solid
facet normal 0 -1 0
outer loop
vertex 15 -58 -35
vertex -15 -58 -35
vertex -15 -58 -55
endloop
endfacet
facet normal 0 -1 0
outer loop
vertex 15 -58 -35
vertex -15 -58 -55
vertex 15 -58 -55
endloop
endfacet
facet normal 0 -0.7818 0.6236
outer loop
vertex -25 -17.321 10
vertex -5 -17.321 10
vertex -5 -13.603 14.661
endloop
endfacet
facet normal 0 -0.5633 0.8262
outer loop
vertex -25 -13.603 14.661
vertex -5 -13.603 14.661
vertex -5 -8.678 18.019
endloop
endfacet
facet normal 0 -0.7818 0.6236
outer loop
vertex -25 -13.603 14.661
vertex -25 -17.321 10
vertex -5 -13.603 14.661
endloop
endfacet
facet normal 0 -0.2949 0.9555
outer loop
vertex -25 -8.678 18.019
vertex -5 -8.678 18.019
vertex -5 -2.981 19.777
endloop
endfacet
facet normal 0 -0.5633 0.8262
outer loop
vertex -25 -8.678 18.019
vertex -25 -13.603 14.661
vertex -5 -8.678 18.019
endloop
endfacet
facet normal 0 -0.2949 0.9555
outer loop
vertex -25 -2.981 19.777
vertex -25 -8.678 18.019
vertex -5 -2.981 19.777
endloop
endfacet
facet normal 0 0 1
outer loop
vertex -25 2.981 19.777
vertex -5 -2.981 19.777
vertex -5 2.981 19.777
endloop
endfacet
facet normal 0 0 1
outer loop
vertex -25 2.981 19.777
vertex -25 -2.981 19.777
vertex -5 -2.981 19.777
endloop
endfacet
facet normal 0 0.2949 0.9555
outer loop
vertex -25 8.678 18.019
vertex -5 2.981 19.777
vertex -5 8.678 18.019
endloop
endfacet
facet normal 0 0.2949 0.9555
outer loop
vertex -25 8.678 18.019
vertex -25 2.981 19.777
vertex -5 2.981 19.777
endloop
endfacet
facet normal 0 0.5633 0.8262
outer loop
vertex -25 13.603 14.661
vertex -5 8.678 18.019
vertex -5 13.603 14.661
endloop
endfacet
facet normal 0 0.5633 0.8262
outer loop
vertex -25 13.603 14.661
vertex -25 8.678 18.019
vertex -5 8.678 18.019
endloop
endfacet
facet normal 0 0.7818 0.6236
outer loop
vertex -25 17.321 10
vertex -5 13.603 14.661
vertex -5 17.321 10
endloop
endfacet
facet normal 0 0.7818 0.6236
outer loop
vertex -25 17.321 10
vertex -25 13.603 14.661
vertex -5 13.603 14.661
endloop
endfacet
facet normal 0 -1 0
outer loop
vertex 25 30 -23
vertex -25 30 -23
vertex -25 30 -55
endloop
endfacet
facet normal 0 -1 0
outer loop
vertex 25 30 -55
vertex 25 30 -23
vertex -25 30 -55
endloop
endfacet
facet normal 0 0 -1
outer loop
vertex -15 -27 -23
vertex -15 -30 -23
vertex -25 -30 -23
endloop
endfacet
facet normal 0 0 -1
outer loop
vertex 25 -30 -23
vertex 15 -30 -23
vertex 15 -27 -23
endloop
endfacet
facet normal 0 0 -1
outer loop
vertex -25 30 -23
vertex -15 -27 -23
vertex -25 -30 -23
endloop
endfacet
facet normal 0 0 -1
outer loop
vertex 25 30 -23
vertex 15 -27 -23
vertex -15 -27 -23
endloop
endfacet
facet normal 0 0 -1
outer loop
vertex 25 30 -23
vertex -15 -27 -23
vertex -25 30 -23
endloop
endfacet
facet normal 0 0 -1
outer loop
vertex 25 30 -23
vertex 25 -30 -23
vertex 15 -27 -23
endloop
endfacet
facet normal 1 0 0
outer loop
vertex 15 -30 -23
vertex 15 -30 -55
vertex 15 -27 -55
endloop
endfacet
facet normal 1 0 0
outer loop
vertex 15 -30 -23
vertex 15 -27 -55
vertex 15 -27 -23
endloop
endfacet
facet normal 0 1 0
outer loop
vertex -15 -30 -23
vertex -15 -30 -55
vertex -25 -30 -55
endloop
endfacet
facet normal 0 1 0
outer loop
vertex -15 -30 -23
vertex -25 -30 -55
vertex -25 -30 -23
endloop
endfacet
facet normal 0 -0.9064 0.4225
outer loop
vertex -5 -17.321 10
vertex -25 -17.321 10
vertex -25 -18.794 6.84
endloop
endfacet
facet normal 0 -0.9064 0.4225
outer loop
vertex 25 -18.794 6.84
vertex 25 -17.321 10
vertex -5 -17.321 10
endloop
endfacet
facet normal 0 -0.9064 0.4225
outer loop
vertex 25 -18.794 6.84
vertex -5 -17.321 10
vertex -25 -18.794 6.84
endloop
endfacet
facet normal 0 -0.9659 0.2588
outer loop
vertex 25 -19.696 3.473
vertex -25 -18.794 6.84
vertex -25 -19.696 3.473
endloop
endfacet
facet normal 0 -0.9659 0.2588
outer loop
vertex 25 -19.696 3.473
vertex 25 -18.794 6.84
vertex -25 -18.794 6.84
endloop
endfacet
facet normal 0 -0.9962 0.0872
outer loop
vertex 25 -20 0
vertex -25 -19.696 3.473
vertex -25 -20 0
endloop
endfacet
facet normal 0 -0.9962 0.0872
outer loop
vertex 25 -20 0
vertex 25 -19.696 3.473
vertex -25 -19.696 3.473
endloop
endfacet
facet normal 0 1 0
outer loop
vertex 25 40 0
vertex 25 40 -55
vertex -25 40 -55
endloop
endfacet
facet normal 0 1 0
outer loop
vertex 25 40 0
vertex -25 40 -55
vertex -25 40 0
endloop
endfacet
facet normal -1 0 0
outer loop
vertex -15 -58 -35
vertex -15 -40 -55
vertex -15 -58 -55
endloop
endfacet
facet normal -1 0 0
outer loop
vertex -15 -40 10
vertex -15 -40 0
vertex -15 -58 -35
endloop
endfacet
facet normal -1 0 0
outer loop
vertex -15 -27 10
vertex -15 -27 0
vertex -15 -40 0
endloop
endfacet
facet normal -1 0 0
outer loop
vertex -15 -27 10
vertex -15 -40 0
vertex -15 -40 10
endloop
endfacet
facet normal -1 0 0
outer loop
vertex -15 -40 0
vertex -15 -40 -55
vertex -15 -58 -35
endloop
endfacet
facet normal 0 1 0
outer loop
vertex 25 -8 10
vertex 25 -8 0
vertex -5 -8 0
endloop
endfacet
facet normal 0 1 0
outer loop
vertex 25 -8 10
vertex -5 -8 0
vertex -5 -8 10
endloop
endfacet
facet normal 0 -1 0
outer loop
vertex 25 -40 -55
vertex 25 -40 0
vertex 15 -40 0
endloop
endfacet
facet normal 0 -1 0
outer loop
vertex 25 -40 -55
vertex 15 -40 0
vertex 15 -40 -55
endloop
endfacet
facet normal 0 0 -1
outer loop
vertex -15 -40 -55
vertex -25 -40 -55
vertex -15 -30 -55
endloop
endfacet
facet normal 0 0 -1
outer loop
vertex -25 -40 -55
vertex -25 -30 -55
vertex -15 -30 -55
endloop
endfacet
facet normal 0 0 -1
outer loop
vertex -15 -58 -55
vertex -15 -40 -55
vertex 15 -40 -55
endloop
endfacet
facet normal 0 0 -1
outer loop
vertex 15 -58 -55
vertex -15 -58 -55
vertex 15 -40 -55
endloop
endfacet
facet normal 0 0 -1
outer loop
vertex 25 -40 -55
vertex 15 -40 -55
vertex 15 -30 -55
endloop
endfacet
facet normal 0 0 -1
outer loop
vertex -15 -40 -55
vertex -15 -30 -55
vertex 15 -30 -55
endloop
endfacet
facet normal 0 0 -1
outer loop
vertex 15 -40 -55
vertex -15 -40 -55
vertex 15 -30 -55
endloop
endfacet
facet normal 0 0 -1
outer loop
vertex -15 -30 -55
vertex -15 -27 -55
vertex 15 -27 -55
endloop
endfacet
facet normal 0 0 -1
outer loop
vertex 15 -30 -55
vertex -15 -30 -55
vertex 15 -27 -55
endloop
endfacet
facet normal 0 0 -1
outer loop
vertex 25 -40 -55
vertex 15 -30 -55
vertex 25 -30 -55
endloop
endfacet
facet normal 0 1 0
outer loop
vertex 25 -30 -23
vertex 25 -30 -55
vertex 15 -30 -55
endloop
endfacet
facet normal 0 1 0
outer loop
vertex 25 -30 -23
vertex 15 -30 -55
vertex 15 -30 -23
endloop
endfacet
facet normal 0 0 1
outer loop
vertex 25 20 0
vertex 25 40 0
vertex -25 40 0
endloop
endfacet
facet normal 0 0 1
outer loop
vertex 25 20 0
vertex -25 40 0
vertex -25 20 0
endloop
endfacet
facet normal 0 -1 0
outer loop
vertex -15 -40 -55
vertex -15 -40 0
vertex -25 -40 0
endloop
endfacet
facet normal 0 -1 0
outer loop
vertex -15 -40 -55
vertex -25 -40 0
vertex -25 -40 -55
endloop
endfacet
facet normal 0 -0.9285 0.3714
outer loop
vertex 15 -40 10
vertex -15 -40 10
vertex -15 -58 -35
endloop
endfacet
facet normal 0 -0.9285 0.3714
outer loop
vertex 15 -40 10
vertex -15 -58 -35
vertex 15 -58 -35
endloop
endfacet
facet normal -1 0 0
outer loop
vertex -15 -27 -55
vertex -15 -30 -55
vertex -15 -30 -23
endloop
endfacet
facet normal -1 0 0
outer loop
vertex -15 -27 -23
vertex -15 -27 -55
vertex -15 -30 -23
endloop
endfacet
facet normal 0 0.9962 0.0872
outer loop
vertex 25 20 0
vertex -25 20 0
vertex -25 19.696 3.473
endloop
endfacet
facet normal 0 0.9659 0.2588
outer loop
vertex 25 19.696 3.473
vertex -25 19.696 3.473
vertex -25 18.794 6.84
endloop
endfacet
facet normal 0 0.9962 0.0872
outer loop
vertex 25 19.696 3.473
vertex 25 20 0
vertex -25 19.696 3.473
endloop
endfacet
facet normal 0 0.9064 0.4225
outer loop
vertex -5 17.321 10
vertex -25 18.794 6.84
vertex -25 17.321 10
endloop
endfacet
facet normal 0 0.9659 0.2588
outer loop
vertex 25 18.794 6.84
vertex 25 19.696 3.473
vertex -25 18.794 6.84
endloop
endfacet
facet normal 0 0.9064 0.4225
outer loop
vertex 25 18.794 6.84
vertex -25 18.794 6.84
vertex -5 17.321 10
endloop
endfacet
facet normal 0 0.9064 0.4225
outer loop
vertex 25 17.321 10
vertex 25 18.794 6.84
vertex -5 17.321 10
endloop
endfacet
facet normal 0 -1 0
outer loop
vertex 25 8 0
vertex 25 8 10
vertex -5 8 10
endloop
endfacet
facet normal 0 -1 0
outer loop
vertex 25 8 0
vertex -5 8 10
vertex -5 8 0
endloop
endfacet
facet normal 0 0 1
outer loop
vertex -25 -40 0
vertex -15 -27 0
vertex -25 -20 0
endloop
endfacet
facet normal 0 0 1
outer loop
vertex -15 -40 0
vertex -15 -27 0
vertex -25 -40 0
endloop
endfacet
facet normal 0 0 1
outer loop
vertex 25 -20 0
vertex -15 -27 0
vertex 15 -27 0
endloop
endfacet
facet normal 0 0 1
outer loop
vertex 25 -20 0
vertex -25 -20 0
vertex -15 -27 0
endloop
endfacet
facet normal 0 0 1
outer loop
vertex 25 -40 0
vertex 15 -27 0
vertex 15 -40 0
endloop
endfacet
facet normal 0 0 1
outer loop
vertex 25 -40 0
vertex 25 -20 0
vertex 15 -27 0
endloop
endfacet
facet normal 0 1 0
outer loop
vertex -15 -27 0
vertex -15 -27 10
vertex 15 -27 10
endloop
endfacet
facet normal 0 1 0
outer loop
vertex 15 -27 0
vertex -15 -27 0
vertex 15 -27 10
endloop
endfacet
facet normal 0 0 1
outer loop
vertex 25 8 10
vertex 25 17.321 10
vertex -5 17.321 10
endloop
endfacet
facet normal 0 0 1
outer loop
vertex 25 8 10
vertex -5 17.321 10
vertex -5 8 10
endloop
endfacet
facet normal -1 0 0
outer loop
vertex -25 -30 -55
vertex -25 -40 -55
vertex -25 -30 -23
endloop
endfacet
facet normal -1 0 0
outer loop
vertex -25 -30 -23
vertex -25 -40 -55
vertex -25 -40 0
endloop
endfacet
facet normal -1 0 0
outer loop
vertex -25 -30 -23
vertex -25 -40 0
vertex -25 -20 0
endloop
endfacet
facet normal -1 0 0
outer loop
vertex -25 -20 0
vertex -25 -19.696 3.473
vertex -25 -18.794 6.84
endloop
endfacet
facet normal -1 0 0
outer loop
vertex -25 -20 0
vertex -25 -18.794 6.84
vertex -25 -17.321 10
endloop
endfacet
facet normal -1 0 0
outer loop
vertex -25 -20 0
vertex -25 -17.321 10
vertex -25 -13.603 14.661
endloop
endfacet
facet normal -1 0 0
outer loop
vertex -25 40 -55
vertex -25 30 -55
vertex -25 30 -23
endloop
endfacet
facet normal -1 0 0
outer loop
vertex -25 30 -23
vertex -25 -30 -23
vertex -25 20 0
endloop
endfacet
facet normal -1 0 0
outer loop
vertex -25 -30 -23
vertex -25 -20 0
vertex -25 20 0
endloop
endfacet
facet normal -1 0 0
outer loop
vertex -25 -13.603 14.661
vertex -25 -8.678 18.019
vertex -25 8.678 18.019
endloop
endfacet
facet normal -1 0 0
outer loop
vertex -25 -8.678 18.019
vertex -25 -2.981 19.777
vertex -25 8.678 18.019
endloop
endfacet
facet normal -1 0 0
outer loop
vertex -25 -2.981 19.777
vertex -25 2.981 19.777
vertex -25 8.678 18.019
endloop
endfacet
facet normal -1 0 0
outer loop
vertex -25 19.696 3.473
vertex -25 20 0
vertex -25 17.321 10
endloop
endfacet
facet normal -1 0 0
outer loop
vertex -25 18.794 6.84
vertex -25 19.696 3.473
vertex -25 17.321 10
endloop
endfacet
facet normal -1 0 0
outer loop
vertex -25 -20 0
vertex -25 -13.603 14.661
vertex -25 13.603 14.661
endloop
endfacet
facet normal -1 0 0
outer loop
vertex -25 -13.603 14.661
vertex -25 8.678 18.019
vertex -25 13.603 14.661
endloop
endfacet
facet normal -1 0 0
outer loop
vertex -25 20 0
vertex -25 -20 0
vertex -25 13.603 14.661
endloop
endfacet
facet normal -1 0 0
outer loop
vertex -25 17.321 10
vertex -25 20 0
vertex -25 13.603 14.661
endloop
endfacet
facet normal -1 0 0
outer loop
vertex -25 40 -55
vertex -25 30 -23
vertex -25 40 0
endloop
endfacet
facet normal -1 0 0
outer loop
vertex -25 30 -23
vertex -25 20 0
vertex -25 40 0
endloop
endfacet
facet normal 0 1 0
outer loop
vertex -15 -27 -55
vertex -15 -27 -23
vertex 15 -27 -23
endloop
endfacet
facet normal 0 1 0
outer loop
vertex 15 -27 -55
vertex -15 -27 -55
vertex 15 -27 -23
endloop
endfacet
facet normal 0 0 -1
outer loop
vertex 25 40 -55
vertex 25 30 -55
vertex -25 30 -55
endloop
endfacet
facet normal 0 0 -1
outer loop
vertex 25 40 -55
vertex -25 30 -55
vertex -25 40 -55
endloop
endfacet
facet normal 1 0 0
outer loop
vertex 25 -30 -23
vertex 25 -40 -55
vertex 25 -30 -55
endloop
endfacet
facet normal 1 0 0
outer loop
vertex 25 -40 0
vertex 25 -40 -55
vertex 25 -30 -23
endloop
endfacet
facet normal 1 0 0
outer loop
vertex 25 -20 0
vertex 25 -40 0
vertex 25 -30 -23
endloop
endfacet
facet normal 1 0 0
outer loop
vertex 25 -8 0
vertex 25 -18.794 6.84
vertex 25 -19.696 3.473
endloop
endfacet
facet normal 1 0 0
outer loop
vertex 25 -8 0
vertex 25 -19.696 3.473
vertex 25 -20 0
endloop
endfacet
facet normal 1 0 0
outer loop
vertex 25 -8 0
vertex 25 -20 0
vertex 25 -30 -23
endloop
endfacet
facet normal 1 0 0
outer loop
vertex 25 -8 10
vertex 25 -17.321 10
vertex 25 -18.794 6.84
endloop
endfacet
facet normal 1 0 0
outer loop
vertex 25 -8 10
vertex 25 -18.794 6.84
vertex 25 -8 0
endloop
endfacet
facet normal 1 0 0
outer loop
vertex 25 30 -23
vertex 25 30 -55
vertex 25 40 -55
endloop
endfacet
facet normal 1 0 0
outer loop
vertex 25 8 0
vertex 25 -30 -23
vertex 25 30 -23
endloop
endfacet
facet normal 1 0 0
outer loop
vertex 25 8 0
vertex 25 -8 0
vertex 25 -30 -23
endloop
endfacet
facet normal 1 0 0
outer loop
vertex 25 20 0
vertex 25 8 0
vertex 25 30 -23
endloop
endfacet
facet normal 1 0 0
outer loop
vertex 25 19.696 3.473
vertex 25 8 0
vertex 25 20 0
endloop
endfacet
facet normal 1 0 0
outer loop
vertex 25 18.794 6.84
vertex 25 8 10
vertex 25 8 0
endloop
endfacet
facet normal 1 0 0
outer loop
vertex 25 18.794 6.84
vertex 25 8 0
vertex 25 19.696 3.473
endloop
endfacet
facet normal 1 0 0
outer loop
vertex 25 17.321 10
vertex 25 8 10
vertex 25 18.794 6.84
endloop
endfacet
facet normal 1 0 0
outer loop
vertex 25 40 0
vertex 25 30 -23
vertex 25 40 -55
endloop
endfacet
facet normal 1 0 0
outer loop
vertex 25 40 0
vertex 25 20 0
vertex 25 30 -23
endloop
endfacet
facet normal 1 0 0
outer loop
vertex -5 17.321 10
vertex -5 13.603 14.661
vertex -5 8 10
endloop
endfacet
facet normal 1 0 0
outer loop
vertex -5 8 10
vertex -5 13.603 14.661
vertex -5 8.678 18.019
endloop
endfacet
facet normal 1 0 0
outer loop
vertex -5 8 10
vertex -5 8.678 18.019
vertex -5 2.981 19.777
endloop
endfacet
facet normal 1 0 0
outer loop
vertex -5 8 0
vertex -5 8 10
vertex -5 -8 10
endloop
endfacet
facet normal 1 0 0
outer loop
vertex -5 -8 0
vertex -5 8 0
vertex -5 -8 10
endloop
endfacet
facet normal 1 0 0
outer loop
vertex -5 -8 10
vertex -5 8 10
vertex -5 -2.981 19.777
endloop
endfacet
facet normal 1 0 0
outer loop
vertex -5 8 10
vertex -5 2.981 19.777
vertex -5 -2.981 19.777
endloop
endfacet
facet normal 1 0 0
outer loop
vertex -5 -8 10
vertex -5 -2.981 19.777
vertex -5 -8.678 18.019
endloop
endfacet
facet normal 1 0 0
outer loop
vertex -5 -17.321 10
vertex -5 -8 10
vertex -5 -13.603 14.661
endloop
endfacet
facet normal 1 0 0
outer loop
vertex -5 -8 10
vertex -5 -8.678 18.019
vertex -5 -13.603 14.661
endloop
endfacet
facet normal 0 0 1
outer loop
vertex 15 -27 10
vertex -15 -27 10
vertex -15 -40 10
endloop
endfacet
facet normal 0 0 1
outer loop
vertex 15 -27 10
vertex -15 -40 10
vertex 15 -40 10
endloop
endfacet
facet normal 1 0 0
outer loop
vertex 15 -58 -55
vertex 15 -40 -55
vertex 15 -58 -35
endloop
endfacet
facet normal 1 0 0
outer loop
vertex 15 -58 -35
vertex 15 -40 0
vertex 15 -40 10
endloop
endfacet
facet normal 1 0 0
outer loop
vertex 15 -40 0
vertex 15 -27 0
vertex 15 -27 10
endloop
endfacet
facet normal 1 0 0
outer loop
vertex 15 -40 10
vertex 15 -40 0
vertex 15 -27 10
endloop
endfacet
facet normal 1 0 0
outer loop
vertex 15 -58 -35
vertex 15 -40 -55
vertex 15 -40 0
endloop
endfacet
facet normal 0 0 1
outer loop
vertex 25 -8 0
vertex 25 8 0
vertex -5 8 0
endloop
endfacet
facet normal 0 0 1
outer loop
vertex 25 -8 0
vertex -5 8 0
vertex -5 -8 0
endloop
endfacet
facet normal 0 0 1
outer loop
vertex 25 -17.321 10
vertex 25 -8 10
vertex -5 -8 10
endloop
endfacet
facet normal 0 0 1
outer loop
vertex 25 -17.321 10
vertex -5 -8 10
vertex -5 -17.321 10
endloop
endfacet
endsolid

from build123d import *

# Parameters (mm, degrees)
F1_DEPTH      = 25
F2_W          = 30
F2_H          = 65
F3_DEPTH      = 18
F3_DEPTH_BACK = 13
F4_SIZE2      = 18
F4_SIZE       = 45
F6_DEPTH      = 20


with BuildPart() as f1:
    # F0 (on Right) → F1 (new body, symmetric)
    with BuildSketch(Plane.YZ):
        with BuildLine():
            Line((8, 0), (0, 0))
            Line((0, 0), (-8, 0))
            Line((-8, 0), (-8, 10))
            Line((-8, 10), (-17.3205080757, 10))
            ThreePointArc((-17.3205080757, 10), (-19.3185165258, 5.1763809021), (-20, 0))
            Line((-20, 0), (-40, 0))
            Line((-40, 0), (-40, -55))
            Line((-40, -55), (-30, -55))
            Line((-30, -55), (-30, -23))
            Line((-30, -23), (0, -23))
            Line((0, -23), (30, -23))
            Line((30, -23), (30, -55))
            Line((30, -55), (40, -55))
            Line((40, -55), (40, 0))
            Line((40, 0), (20, 0))
            ThreePointArc((20, 0), (19.3185165258, 5.1763809021), (17.3205080757, 10))
            Line((17.3205080757, 10), (8, 10))
            Line((8, 10), (8, 0))
        make_face()
    extrude(amount=F1_DEPTH, both=True)

    # F2 (on face) → F3 (join, two sides)
    with BuildSketch(Plane.XZ.offset(40)) as f3_sk:
        with Locations((0, -22.5)):
            Rectangle(F2_W, F2_H)
    extrude(amount=F3_DEPTH)
    extrude(f3_sk.sketch, amount=-F3_DEPTH_BACK)

    # F4
    f4_edges = [f1.edges().sort_by_distance(p)[0] for p in [
        (0, -58, 10),
    ]]
    f4_side = f1.faces().sort_by_distance((0, -58, -22.5))[0]
    chamfer(f4_edges, length=F4_SIZE, length2=F4_SIZE2, reference=f4_side)

    # F5 (on face) → F6 (join)
    with BuildSketch(Plane(origin=(-25, 0, 0), x_dir=(0, -1, 0), z_dir=(-1, 0, 0))):
        with BuildLine():
            Line((-20, 0), (20, 0))
            ThreePointArc((20, 0), (0, 20), (-20, 0))
        make_face()
    extrude(amount=-F6_DEPTH)


solid = f1.part
